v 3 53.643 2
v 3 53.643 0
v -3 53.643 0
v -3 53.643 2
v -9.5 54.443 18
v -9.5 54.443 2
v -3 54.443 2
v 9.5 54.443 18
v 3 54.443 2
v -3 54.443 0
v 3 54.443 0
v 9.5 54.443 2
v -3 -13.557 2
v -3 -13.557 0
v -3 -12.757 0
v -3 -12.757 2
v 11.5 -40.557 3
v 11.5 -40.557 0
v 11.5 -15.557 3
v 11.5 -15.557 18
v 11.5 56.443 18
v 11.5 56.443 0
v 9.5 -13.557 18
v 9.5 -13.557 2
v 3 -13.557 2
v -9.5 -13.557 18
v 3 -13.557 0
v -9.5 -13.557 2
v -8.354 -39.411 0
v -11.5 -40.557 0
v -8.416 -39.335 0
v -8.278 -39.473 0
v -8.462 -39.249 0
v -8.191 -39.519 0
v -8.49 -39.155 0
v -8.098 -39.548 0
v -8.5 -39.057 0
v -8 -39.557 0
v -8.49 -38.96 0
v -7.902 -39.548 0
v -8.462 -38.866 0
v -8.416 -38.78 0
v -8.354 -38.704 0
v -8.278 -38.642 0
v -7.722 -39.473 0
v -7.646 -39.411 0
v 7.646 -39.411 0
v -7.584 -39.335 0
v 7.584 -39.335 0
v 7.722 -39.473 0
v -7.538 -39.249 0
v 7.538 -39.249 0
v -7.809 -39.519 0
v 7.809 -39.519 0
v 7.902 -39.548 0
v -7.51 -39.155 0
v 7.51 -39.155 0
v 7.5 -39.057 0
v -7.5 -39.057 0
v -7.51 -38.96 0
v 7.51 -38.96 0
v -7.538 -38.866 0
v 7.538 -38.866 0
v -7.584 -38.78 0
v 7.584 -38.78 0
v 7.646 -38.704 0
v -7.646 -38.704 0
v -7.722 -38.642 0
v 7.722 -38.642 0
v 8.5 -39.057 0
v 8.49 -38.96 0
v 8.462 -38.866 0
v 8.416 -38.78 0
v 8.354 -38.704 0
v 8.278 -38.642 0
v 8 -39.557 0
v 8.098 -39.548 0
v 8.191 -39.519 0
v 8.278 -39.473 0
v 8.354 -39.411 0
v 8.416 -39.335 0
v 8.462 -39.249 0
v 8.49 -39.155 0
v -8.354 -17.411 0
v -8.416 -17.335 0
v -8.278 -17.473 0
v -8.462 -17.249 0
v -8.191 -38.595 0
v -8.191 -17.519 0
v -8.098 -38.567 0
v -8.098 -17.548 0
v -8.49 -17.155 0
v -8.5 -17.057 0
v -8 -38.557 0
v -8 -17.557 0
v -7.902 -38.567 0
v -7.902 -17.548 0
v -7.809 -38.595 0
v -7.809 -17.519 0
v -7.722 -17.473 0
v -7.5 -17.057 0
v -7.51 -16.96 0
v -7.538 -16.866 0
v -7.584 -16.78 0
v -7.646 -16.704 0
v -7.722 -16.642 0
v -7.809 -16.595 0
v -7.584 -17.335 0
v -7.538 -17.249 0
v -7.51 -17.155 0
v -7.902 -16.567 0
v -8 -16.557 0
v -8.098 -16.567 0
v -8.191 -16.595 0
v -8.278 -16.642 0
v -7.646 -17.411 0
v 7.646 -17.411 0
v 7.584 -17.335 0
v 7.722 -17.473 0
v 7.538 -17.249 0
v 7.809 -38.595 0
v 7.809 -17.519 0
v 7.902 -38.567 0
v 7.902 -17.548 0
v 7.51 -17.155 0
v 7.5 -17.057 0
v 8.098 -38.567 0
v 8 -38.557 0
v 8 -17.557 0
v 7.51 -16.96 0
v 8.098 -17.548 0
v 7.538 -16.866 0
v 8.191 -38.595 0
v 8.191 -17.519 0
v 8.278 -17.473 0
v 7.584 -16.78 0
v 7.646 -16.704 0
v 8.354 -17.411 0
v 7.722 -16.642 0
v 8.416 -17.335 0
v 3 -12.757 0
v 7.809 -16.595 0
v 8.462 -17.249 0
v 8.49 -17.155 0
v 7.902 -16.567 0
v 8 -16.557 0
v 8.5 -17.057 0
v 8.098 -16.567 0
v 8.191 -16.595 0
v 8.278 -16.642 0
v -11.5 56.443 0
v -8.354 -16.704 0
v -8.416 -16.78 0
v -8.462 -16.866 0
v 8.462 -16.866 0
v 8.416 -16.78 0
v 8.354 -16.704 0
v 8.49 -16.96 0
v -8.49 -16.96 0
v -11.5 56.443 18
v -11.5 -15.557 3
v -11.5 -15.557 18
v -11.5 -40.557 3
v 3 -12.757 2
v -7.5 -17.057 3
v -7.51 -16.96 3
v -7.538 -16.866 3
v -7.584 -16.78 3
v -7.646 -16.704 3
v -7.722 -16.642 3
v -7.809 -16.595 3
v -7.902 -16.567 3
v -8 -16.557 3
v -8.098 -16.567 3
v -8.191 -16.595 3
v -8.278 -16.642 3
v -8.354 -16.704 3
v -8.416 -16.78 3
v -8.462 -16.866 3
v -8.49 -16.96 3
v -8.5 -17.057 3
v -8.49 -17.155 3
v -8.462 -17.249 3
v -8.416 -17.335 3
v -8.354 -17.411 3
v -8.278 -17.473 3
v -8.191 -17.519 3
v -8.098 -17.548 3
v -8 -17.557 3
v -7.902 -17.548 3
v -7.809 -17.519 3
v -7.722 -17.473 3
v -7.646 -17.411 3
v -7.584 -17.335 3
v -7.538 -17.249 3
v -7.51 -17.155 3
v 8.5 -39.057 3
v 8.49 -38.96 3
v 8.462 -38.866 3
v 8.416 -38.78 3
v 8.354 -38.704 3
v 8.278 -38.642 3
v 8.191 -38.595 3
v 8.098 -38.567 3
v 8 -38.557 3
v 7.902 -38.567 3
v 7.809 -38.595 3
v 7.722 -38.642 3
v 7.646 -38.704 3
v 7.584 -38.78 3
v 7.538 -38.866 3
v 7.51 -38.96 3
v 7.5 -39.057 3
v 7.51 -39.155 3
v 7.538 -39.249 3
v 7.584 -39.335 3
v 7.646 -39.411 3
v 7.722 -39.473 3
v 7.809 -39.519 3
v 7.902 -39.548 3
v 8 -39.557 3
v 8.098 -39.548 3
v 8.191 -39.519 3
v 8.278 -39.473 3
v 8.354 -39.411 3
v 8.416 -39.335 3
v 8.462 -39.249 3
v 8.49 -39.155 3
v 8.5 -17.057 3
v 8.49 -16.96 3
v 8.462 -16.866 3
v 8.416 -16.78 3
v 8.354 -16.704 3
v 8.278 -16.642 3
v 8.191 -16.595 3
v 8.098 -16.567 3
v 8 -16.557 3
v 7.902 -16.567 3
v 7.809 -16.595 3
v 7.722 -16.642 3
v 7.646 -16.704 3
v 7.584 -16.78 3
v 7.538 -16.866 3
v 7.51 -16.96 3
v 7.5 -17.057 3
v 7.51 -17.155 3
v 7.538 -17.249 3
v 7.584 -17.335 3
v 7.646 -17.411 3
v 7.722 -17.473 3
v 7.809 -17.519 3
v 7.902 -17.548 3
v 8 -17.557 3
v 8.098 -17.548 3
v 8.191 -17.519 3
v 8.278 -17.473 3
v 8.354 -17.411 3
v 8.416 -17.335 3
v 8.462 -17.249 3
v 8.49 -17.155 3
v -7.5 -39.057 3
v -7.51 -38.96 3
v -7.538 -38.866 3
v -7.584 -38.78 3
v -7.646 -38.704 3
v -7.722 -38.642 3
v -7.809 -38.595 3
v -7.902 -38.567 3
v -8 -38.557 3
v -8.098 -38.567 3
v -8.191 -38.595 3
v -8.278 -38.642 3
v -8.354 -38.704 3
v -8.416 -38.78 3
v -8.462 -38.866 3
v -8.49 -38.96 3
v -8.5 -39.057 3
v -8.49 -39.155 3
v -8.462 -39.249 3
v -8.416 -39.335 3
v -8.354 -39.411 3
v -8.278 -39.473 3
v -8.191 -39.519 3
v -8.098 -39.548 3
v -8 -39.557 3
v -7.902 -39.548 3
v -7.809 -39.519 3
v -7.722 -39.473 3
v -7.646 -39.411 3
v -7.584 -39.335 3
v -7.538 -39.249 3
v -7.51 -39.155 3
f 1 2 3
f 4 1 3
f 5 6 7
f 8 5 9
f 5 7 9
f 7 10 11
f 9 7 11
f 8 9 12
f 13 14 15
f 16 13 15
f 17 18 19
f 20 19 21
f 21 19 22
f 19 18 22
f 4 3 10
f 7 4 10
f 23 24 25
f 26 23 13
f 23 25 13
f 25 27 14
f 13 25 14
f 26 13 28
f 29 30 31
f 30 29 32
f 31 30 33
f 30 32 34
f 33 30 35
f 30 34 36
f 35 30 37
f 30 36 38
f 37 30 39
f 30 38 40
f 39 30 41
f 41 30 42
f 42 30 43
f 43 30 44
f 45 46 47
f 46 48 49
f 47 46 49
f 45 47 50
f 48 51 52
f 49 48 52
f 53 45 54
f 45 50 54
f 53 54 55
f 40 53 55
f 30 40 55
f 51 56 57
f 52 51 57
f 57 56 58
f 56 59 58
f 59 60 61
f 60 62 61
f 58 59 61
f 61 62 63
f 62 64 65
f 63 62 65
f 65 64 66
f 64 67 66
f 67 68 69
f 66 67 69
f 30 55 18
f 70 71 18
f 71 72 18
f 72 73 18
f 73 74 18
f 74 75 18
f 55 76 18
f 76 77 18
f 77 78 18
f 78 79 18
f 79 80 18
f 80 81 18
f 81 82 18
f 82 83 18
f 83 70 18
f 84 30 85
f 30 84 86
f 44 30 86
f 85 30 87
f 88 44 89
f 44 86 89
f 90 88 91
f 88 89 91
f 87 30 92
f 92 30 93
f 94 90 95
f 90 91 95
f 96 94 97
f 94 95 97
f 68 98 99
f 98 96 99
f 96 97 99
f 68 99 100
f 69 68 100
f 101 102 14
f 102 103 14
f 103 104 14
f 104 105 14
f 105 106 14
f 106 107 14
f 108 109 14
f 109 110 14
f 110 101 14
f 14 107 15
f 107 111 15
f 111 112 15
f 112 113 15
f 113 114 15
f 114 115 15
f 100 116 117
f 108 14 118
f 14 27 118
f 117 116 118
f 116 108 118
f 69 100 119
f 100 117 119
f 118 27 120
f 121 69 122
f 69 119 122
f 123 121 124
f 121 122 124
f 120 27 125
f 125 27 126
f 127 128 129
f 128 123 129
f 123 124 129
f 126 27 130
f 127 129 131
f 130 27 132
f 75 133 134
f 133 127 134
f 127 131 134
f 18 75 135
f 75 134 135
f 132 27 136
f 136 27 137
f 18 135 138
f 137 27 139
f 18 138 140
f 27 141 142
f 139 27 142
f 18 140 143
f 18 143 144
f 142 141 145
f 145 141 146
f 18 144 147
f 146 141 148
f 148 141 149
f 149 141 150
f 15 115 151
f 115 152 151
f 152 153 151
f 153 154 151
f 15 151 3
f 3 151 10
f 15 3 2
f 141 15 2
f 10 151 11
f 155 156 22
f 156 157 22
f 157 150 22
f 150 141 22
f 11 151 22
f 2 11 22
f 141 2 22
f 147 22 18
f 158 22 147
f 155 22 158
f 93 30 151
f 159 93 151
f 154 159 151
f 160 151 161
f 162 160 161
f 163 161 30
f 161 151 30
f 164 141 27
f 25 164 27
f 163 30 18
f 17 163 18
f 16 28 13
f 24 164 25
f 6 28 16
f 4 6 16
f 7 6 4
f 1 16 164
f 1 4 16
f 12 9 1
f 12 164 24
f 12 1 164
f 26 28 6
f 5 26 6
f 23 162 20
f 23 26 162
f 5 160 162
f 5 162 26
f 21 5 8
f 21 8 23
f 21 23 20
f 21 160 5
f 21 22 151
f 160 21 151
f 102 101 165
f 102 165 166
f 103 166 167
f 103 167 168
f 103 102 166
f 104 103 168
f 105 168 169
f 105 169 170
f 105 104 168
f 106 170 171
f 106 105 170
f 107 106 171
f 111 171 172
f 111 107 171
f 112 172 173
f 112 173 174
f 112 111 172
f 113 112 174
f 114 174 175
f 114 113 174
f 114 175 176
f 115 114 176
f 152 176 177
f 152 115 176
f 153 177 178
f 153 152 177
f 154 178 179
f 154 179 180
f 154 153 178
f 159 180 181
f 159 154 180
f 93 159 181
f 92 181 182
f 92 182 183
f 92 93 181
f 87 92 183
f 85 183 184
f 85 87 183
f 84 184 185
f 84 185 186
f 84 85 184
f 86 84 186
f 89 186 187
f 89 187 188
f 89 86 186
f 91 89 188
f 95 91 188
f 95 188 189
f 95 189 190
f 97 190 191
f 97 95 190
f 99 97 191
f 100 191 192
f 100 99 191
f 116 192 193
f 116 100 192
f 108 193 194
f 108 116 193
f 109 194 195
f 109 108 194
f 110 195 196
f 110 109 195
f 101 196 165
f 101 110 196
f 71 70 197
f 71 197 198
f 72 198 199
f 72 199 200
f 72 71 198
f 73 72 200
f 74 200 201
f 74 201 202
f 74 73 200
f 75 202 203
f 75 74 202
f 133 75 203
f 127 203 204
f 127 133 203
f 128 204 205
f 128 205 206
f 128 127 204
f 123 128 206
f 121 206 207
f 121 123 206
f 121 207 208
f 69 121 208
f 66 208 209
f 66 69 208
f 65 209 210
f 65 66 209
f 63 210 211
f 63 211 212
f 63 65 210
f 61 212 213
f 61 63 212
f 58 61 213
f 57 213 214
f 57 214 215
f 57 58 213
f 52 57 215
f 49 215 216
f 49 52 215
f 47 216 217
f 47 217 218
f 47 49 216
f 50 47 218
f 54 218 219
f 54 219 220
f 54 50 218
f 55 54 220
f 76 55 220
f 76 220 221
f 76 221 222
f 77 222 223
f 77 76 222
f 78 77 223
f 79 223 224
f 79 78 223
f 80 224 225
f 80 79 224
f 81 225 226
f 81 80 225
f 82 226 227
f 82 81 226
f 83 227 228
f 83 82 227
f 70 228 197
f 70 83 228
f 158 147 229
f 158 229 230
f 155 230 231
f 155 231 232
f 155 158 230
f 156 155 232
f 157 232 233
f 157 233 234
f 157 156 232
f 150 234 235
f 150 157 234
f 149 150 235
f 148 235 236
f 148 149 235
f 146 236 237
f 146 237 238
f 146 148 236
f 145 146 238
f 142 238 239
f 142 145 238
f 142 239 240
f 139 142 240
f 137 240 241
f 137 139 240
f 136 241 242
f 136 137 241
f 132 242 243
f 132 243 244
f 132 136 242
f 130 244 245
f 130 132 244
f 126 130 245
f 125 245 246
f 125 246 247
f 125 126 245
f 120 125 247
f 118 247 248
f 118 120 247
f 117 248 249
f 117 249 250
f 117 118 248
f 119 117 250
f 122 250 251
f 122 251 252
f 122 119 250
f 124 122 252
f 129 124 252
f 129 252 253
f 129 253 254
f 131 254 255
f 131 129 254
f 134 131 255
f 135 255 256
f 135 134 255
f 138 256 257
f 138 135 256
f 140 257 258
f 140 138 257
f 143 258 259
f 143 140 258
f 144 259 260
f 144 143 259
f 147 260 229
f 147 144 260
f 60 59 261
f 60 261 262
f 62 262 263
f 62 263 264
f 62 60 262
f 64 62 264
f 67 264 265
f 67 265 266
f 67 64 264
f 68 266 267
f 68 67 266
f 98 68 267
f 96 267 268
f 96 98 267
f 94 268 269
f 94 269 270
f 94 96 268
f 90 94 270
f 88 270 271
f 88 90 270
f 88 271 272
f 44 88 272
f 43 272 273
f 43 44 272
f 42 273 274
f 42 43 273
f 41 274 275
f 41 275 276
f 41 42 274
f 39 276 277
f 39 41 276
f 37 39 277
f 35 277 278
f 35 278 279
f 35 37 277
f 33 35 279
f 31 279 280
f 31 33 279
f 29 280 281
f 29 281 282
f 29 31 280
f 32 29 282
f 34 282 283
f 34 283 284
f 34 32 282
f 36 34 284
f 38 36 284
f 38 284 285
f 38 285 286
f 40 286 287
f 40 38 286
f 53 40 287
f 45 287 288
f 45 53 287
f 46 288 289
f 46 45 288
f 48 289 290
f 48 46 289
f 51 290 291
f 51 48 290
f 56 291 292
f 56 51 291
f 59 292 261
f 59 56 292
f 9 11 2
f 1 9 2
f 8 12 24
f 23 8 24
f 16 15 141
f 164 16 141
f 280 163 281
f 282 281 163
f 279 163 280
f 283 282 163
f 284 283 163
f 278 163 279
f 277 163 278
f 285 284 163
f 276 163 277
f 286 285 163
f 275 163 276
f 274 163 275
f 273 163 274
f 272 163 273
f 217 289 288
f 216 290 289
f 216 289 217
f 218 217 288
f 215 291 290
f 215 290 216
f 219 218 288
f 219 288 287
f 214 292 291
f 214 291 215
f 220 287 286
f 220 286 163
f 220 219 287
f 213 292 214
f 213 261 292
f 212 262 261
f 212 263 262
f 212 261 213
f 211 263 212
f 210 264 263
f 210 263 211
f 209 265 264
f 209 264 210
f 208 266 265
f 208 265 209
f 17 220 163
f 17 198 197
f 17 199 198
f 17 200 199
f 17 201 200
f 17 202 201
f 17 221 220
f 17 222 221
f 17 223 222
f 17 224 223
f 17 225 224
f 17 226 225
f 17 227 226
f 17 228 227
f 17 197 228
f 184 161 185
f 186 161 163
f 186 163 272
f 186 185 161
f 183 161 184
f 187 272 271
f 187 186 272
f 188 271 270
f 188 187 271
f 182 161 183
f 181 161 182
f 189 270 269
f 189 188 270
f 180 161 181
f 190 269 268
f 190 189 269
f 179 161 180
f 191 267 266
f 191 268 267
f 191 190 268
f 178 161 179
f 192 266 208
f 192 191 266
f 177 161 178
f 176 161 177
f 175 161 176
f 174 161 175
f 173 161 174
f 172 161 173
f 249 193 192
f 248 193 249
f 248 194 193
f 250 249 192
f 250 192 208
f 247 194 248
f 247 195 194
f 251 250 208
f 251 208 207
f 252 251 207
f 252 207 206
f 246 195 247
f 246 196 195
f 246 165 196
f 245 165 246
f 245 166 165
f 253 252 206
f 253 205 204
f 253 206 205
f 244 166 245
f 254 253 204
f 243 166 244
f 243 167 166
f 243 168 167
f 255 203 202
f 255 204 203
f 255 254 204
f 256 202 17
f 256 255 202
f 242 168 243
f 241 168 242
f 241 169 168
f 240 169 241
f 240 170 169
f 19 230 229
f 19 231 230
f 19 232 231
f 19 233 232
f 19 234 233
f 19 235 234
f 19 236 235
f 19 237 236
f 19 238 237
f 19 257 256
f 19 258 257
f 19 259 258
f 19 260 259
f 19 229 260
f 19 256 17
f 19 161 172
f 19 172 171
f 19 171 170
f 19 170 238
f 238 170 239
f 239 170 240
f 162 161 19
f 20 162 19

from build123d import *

# Parameters (mm, degrees)
F1_DEPTH = 2
F2_DEPTH = 18
F0_R     = 0.5
F3_DEPTH = 3


with BuildPart() as f1:
    # F0 (on Top) → F1 (new body)
    with BuildSketch(Plane.XY):
        Polygon((-3, 54.44269), (-9.5, 54.44269), (-9.5, -13.55731), (-3, -13.55731), (-3, -12.75731), (0, -12.75731), (3, -12.75731), (3, -13.55731), (9.5, -13.55731), (9.5, 54.44269), (3, 54.44269), (3, 53.64269), (0, 53.64269), (-3, 53.64269), align=None)
    extrude(amount=F1_DEPTH)

    # F0 (on Top) → F2 (join)
    with BuildSketch(Plane.XY):
        Polygon((-11.5, -15.55731), (0, -15.55731), (11.5, -15.55731), (11.5, 56.44269), (0, 56.44269), (-11.5, 56.44269), align=None)
        Polygon((-9.5, -13.55731), (-9.5, 54.44269), (-3, 54.44269), (0, 54.44269), (3, 54.44269), (9.5, 54.44269), (9.5, -13.55731), (3, -13.55731), (0, -13.55731), (-3, -13.55731), align=None, mode=Mode.SUBTRACT)
    extrude(amount=F2_DEPTH)

    # F0 (on Top) → F3 (join)
    with BuildSketch(Plane.XY):
        Polygon((11.5, -15.55731), (0, -15.55731), (-11.5, -15.55731), (-11.5, -40.55731), (0, -40.55731), (11.5, -40.55731), align=None)
        with Locations((-8, -39.05731)):
            Circle(F0_R, mode=Mode.SUBTRACT)
        with Locations((-8, -17.05731)):
            Circle(F0_R, mode=Mode.SUBTRACT)
        with Locations((8, -39.05731)):
            Circle(F0_R, mode=Mode.SUBTRACT)
        with Locations((8, -17.05731)):
            Circle(F0_R, mode=Mode.SUBTRACT)
    extrude(amount=F3_DEPTH)


solid = f1.part
